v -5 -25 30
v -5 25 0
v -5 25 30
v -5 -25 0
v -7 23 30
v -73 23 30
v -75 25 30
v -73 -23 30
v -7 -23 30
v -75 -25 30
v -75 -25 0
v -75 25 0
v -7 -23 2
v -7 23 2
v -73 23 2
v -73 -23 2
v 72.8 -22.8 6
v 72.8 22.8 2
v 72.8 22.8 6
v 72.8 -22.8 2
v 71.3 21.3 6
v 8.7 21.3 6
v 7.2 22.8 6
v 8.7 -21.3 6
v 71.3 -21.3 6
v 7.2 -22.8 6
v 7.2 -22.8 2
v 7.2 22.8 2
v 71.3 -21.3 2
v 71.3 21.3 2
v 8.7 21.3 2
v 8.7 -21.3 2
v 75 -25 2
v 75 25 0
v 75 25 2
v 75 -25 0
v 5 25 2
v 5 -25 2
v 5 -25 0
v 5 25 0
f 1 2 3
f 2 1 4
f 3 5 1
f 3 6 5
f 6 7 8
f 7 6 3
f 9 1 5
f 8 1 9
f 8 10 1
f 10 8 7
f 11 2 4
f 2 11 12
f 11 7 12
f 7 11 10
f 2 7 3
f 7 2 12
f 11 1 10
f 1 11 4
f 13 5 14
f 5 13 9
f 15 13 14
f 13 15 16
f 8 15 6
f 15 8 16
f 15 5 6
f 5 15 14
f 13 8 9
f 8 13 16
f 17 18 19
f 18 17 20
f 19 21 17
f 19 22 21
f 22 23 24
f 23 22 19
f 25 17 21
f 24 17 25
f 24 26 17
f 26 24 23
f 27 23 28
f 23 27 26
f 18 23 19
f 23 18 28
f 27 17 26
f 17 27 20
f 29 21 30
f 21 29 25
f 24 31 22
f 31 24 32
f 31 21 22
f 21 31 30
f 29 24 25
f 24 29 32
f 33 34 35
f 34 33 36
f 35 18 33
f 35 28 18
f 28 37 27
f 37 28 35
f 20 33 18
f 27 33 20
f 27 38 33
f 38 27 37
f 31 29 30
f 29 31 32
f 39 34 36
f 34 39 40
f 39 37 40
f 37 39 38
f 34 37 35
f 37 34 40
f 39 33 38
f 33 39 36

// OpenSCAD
// Two-part electronics enclosure: box + lid (printed upside down), side by side

$fn = 64;

// ---- Box ----
box_x = 70;          // box outer X
box_y = 50;          // box outer Y
box_z = 30;          // box outer height
wall = 2;            // box wall thickness
floor_t = 2;         // box floor thickness

// ---- Lid ----
lid_x = 70;          // lid plate X
lid_y = 50;          // lid plate Y
lid_t = 2;           // lid plate thickness
lip_wall = 1.5;      // lip wall thickness
lip_h = 4;           // lip height above plate
lip_x = 65.6;        // lip outer X
lip_y = 45.6;        // lip outer Y

// ---- Layout ----
gap = 10;            // gap between parts
eps = 0.01;          // small overshoot for clean cuts

total_x = box_x + gap + lid_x;
box_cx = -total_x/2 + box_x/2;   // box centre X
lid_cx = total_x/2 - lid_x/2;    // lid centre X (+X side)

// Box: open top
module box() {
    translate([box_cx, 0, 0])
    difference() {
        translate([-box_x/2, -box_y/2, 0])
            cube([box_x, box_y, box_z]);
        translate([-(box_x - 2*wall)/2, -(box_y - 2*wall)/2, floor_t])
            cube([box_x - 2*wall, box_y - 2*wall, box_z - floor_t + 1]);
    }
}

// Lid: plate on bed, lip on top
module lid() {
    translate([lid_cx, 0, 0]) {
        translate([-lid_x/2, -lid_y/2, 0])
            cube([lid_x, lid_y, lid_t]);
        difference() {
            translate([-lip_x/2, -lip_y/2, lid_t - eps])
                cube([lip_x, lip_y, lip_h + eps]);
            translate([-(lip_x - 2*lip_wall)/2, -(lip_y - 2*lip_wall)/2, lid_t - 1])
                cube([lip_x - 2*lip_wall, lip_y - 2*lip_wall, lip_h + 2]);
        }
    }
}

box();
lid();
